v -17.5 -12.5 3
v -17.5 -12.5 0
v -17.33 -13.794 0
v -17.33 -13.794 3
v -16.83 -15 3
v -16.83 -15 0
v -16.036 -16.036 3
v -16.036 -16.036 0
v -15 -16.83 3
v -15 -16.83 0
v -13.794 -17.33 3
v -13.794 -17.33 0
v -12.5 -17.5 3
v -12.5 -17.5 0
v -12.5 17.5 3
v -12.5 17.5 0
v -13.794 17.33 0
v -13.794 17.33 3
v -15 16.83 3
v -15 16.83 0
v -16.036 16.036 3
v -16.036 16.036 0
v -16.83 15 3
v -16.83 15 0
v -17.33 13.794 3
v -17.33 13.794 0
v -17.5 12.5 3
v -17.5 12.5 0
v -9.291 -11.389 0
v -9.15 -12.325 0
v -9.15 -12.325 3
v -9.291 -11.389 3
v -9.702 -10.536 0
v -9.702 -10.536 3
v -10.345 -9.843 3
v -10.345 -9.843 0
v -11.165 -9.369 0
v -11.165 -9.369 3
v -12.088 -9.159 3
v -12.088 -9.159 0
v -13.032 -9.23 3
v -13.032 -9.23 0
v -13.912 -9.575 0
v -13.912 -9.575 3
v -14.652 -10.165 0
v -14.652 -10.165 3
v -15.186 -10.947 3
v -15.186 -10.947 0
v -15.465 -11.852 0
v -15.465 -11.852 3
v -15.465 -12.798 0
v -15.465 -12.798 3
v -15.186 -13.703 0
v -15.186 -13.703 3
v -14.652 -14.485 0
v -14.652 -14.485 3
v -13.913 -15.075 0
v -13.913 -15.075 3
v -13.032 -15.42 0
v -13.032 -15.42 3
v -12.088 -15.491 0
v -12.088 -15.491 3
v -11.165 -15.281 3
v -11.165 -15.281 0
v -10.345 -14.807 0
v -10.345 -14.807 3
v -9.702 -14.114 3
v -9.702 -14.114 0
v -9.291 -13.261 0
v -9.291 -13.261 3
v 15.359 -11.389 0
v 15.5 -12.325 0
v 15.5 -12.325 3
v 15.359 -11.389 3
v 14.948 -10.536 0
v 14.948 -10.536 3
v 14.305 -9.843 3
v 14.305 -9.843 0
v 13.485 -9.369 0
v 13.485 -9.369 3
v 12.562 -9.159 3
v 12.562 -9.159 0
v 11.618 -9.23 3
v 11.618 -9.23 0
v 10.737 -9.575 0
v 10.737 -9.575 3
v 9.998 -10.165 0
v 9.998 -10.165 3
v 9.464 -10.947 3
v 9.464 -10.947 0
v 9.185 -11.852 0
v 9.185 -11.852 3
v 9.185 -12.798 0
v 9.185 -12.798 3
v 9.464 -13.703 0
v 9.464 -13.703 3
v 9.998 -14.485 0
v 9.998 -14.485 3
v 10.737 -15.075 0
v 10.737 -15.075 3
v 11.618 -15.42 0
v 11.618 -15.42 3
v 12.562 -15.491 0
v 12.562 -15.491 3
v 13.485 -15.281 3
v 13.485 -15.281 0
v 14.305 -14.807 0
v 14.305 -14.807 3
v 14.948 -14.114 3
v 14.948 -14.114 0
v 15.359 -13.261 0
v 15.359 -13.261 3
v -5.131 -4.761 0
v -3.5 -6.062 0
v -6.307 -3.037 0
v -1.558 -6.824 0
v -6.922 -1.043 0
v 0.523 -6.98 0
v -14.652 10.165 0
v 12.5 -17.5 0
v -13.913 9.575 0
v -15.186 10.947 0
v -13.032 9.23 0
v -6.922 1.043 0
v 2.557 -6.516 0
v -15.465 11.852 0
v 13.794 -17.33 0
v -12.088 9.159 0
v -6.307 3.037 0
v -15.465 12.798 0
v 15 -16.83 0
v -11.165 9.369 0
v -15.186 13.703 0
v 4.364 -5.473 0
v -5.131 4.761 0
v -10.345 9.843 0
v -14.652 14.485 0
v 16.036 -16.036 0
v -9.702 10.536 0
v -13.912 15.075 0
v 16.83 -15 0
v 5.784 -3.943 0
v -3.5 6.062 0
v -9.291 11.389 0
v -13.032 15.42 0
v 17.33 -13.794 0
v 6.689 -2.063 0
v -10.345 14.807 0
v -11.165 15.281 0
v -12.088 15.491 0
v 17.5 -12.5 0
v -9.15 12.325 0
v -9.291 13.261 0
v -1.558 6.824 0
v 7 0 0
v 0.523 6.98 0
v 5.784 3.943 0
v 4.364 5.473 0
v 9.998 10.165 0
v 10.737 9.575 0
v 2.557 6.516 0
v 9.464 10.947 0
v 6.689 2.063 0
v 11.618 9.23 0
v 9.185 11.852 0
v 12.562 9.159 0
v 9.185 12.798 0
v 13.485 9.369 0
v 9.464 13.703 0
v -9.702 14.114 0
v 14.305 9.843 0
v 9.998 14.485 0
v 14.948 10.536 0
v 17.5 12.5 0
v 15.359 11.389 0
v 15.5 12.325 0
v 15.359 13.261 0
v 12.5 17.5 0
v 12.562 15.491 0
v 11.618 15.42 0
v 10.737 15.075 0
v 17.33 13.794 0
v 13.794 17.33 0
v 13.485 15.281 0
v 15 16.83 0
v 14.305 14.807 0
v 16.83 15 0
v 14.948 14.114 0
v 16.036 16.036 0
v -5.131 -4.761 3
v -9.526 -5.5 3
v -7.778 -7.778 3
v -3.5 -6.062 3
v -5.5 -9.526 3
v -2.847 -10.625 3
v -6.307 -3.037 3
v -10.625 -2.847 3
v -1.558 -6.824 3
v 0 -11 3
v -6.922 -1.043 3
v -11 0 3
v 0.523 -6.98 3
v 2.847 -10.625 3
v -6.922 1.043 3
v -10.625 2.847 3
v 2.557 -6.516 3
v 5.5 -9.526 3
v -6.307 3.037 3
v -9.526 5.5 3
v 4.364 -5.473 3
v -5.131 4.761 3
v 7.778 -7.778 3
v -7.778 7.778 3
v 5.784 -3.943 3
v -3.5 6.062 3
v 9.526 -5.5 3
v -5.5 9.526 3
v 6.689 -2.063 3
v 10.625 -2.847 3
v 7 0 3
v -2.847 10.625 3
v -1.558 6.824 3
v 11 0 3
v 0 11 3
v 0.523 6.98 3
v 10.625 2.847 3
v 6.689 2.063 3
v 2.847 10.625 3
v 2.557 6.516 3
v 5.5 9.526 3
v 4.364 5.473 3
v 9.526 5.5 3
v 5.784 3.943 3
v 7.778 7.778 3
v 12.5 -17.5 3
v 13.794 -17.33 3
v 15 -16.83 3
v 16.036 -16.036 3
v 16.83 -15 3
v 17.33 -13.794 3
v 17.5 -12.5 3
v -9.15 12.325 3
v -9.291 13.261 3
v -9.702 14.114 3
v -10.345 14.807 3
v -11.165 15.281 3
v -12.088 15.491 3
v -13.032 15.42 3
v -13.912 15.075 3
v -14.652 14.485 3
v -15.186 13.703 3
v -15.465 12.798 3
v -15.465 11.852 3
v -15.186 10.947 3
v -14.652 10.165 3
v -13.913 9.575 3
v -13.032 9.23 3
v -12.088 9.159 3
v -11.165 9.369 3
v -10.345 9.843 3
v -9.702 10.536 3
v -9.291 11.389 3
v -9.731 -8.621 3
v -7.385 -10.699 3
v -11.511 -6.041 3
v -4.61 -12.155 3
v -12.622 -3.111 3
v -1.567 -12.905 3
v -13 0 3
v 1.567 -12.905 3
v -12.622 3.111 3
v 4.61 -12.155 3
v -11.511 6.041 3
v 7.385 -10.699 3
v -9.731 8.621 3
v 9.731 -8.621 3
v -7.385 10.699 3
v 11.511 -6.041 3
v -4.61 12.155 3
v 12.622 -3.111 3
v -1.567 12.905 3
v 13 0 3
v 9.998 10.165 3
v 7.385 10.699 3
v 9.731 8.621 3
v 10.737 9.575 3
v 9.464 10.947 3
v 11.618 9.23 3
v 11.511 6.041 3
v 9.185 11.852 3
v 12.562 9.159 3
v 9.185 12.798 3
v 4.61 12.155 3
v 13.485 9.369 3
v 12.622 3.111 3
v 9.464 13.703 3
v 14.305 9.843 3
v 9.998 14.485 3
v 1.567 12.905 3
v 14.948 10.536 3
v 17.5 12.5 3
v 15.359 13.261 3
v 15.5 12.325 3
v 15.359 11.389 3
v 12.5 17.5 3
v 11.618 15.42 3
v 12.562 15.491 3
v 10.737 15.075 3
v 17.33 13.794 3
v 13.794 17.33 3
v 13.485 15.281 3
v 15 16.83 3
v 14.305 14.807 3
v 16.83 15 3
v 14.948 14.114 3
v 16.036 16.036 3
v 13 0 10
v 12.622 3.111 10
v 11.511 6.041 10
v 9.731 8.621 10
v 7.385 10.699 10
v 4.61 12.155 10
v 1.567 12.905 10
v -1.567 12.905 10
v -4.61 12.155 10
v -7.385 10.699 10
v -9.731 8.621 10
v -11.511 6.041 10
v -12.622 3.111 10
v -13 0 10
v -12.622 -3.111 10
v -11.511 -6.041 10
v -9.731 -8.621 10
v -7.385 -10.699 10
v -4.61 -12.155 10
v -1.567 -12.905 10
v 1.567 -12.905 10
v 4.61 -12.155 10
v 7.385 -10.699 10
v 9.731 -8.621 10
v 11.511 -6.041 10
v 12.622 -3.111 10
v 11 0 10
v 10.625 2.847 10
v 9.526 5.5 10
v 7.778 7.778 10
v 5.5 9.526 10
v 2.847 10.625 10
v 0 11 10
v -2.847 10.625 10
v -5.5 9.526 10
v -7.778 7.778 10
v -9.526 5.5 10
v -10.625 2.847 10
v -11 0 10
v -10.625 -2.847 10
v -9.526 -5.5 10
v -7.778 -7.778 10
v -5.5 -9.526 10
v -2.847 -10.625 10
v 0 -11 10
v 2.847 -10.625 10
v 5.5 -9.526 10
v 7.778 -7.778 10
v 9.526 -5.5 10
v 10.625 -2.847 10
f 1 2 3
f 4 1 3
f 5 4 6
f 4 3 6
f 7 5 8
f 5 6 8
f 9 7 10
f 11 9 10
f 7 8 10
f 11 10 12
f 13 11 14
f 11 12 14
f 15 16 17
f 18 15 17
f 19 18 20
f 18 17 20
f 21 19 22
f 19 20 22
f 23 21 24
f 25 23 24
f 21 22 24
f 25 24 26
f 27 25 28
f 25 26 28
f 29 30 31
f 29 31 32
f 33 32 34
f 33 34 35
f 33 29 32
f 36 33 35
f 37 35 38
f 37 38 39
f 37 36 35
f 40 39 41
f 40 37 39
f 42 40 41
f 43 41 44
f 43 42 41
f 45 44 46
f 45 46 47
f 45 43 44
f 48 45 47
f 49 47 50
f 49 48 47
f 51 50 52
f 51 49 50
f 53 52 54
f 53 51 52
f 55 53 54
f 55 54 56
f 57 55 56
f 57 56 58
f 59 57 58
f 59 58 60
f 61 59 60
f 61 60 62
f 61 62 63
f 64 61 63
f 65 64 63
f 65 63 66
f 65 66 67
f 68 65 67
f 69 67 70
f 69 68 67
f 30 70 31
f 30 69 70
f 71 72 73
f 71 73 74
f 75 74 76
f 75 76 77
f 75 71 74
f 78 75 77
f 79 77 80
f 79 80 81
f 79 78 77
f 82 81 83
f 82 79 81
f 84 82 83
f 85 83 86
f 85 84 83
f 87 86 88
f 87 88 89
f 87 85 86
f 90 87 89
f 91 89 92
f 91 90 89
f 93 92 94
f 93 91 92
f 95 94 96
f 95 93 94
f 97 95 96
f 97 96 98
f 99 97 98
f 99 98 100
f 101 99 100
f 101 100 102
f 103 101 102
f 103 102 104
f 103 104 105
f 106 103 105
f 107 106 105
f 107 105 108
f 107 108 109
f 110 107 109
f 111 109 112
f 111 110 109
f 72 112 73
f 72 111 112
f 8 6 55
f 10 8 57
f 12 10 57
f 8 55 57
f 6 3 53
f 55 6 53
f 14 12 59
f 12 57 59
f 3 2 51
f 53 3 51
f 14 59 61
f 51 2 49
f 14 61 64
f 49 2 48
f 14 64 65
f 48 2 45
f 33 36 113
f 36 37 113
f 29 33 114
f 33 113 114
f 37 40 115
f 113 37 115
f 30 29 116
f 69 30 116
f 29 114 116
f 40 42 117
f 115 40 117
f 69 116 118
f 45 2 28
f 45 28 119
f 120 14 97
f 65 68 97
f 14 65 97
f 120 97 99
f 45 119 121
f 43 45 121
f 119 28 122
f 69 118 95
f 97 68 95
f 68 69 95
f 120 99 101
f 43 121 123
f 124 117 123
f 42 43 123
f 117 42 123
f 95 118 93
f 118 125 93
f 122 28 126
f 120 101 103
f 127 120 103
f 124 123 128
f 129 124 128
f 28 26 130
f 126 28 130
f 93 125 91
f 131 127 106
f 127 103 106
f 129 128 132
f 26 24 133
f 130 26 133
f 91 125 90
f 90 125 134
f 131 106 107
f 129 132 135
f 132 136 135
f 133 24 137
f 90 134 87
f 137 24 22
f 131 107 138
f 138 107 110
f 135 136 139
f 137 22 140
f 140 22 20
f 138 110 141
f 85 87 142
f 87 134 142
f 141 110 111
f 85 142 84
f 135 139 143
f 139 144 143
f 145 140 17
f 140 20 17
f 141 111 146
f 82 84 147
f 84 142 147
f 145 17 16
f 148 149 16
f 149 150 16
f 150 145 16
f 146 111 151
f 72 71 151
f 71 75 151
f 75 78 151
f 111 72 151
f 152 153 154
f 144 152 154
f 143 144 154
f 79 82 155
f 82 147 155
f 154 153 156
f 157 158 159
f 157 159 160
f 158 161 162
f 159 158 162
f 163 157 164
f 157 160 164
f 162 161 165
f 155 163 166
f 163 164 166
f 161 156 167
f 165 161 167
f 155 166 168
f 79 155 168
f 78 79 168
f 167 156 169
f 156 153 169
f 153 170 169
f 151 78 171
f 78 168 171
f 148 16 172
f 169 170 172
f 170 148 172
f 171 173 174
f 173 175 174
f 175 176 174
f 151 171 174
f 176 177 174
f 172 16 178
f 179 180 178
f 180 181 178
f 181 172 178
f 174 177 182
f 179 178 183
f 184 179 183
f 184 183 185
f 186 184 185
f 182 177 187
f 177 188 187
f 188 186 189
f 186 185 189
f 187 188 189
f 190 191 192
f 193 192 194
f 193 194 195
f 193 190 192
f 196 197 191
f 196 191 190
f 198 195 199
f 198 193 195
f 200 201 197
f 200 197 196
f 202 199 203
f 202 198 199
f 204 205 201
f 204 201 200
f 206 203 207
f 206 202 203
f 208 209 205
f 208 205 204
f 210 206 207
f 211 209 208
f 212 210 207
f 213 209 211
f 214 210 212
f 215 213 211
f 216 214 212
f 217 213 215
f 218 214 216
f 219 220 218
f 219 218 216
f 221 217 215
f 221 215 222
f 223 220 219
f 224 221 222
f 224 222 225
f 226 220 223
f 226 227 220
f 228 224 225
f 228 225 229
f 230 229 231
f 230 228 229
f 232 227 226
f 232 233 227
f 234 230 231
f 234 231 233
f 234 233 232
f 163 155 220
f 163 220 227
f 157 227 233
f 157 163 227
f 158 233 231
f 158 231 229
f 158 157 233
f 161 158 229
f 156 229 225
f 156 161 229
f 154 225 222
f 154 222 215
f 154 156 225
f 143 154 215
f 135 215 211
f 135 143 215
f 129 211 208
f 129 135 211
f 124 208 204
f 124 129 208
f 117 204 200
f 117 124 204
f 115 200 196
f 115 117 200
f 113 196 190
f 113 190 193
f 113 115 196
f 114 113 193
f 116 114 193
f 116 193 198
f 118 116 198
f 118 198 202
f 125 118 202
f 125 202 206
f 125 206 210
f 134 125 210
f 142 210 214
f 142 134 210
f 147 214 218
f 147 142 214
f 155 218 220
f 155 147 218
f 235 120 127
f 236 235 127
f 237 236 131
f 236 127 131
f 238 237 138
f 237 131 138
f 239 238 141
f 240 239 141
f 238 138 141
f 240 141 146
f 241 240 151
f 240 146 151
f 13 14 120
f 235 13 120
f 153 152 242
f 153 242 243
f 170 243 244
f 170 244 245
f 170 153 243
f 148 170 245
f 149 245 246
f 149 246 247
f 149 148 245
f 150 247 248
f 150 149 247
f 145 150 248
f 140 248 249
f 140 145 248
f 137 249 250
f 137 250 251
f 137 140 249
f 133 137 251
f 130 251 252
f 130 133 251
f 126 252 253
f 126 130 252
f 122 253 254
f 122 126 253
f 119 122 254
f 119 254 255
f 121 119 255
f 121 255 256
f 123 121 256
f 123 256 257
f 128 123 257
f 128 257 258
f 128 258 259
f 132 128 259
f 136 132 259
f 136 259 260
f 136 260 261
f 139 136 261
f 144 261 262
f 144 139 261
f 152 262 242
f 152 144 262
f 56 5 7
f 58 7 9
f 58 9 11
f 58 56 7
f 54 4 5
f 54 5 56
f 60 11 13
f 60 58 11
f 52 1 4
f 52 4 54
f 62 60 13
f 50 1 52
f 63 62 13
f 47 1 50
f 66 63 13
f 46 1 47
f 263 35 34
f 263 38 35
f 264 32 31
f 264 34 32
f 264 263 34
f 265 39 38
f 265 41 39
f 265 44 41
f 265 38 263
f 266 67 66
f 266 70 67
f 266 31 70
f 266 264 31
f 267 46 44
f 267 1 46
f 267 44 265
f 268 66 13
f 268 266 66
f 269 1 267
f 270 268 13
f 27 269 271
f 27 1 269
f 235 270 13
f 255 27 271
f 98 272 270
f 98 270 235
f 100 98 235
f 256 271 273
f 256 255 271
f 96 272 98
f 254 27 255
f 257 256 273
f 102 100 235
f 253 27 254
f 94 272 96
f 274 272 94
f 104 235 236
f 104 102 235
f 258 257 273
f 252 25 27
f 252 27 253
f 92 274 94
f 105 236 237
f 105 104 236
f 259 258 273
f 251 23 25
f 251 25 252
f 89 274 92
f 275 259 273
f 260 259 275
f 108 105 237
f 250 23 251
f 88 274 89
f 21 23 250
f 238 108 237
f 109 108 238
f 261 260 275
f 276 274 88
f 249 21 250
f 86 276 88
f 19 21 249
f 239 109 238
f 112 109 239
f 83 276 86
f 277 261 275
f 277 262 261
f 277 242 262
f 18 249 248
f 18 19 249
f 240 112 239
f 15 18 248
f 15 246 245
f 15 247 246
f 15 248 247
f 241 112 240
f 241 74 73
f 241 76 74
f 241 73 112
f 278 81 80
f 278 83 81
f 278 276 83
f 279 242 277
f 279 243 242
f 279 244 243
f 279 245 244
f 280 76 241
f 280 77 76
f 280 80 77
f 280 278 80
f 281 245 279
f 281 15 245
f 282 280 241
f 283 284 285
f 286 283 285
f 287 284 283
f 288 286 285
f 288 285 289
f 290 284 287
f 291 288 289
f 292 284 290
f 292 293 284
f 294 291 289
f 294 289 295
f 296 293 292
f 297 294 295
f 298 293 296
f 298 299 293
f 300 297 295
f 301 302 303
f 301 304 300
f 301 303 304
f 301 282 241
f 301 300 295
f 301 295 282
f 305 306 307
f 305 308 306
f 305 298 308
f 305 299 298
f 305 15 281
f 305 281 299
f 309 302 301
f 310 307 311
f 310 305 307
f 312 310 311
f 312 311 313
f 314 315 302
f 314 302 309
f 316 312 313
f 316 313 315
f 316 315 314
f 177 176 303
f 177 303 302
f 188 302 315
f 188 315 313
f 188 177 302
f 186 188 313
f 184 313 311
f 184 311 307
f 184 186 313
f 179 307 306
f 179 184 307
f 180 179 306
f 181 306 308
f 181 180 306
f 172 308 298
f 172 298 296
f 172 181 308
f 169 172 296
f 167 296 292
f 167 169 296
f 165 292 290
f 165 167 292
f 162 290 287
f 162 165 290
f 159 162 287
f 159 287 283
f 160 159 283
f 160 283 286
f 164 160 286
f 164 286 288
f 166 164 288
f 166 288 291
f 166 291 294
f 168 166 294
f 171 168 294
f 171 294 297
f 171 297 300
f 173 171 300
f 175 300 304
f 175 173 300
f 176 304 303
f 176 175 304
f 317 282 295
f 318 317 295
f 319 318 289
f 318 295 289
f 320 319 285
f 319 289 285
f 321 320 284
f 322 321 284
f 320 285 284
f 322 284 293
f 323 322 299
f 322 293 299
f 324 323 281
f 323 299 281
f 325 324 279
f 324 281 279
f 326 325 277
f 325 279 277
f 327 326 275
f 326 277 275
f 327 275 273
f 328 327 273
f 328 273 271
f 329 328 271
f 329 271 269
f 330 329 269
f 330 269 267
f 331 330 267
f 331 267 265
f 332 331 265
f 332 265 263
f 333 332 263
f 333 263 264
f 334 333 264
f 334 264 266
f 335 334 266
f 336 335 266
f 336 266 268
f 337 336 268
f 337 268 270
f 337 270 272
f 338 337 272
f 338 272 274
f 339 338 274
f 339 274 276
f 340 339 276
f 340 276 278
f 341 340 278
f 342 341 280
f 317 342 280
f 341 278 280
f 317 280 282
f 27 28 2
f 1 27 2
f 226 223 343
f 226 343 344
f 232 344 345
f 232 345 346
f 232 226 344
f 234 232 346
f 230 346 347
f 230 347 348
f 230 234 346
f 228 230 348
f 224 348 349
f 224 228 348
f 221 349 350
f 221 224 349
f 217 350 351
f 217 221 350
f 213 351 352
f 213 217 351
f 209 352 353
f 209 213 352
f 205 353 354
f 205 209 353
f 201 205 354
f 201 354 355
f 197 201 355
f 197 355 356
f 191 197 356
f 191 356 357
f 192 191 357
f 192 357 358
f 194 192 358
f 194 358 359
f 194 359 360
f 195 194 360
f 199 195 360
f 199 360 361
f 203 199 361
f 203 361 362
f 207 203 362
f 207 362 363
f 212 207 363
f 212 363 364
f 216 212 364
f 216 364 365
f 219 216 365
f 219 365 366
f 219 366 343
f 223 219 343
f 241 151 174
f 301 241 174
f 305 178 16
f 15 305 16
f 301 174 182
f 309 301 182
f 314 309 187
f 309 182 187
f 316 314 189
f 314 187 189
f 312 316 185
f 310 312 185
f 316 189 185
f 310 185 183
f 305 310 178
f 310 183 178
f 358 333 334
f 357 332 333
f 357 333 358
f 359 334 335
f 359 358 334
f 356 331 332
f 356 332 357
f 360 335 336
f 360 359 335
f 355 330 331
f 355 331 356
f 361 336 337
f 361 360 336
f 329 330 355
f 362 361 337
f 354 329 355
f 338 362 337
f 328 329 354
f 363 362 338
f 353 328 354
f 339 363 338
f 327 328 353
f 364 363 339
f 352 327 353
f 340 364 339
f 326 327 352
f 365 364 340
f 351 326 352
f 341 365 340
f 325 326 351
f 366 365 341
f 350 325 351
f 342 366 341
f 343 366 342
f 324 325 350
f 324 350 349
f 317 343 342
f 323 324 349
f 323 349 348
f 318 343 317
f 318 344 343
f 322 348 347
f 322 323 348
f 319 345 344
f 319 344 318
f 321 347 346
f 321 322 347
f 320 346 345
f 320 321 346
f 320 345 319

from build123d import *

# Parameters (mm, degrees)
F0_R     = 3.175
F0_R_2   = 13
F1_DEPTH = 3
F0_R_3   = 11
F0_R_4   = 7
F2_DEPTH = 10


with BuildPart() as f1:
    # F0 (on Top) → F1 (new body)
    with BuildSketch(Plane.XY):
        with BuildLine():
            ThreePointArc((17.5, 12.5), (16.0355339059, 16.0355339059), (12.5, 17.5))
            Line((12.5, 17.5), (-12.5, 17.5))
            ThreePointArc((-12.5, 17.5), (-16.0355339059, 16.0355339059), (-17.5, 12.5))
            Line((-17.5, 12.5), (-17.5, -12.5))
            ThreePointArc((-17.5, -12.5), (-16.0355339059, -16.0355339059), (-12.5, -17.5))
            Line((-12.5, -17.5), (12.5, -17.5))
            ThreePointArc((12.5, -17.5), (16.0355339059, -16.0355339059), (17.5, -12.5))
            Line((17.5, -12.5), (17.5, 12.5))
        make_face()
        with Locations((-12.325, -12.325)):
            Circle(F0_R, mode=Mode.SUBTRACT)
        with Locations((12.325, -12.325)):
            Circle(F0_R, mode=Mode.SUBTRACT)
        with Locations((-12.325, 12.325)):
            Circle(F0_R, mode=Mode.SUBTRACT)
        Circle(F0_R_2, mode=Mode.SUBTRACT)
        with Locations((12.325, 12.325)):
            Circle(F0_R, mode=Mode.SUBTRACT)
    extrude(amount=F1_DEPTH)



with BuildPart() as f1b:
    # F0 (on Top) → F1, piece 2 (new body)
    with BuildSketch(Plane.XY):
        Circle(F0_R_3)
        Circle(F0_R_4, mode=Mode.SUBTRACT)
    extrude(amount=F1_DEPTH)


with BuildPart() as f1_1:
    add(f1.part)

    add(f1b.part)  # F2 merges F1b
    # F0 (on Top) → F2 (join)
    with BuildSketch(Plane.XY):
        Circle(F0_R_2)
        Circle(F0_R_3, mode=Mode.SUBTRACT)
    extrude(amount=F2_DEPTH)


solid = f1_1.part
